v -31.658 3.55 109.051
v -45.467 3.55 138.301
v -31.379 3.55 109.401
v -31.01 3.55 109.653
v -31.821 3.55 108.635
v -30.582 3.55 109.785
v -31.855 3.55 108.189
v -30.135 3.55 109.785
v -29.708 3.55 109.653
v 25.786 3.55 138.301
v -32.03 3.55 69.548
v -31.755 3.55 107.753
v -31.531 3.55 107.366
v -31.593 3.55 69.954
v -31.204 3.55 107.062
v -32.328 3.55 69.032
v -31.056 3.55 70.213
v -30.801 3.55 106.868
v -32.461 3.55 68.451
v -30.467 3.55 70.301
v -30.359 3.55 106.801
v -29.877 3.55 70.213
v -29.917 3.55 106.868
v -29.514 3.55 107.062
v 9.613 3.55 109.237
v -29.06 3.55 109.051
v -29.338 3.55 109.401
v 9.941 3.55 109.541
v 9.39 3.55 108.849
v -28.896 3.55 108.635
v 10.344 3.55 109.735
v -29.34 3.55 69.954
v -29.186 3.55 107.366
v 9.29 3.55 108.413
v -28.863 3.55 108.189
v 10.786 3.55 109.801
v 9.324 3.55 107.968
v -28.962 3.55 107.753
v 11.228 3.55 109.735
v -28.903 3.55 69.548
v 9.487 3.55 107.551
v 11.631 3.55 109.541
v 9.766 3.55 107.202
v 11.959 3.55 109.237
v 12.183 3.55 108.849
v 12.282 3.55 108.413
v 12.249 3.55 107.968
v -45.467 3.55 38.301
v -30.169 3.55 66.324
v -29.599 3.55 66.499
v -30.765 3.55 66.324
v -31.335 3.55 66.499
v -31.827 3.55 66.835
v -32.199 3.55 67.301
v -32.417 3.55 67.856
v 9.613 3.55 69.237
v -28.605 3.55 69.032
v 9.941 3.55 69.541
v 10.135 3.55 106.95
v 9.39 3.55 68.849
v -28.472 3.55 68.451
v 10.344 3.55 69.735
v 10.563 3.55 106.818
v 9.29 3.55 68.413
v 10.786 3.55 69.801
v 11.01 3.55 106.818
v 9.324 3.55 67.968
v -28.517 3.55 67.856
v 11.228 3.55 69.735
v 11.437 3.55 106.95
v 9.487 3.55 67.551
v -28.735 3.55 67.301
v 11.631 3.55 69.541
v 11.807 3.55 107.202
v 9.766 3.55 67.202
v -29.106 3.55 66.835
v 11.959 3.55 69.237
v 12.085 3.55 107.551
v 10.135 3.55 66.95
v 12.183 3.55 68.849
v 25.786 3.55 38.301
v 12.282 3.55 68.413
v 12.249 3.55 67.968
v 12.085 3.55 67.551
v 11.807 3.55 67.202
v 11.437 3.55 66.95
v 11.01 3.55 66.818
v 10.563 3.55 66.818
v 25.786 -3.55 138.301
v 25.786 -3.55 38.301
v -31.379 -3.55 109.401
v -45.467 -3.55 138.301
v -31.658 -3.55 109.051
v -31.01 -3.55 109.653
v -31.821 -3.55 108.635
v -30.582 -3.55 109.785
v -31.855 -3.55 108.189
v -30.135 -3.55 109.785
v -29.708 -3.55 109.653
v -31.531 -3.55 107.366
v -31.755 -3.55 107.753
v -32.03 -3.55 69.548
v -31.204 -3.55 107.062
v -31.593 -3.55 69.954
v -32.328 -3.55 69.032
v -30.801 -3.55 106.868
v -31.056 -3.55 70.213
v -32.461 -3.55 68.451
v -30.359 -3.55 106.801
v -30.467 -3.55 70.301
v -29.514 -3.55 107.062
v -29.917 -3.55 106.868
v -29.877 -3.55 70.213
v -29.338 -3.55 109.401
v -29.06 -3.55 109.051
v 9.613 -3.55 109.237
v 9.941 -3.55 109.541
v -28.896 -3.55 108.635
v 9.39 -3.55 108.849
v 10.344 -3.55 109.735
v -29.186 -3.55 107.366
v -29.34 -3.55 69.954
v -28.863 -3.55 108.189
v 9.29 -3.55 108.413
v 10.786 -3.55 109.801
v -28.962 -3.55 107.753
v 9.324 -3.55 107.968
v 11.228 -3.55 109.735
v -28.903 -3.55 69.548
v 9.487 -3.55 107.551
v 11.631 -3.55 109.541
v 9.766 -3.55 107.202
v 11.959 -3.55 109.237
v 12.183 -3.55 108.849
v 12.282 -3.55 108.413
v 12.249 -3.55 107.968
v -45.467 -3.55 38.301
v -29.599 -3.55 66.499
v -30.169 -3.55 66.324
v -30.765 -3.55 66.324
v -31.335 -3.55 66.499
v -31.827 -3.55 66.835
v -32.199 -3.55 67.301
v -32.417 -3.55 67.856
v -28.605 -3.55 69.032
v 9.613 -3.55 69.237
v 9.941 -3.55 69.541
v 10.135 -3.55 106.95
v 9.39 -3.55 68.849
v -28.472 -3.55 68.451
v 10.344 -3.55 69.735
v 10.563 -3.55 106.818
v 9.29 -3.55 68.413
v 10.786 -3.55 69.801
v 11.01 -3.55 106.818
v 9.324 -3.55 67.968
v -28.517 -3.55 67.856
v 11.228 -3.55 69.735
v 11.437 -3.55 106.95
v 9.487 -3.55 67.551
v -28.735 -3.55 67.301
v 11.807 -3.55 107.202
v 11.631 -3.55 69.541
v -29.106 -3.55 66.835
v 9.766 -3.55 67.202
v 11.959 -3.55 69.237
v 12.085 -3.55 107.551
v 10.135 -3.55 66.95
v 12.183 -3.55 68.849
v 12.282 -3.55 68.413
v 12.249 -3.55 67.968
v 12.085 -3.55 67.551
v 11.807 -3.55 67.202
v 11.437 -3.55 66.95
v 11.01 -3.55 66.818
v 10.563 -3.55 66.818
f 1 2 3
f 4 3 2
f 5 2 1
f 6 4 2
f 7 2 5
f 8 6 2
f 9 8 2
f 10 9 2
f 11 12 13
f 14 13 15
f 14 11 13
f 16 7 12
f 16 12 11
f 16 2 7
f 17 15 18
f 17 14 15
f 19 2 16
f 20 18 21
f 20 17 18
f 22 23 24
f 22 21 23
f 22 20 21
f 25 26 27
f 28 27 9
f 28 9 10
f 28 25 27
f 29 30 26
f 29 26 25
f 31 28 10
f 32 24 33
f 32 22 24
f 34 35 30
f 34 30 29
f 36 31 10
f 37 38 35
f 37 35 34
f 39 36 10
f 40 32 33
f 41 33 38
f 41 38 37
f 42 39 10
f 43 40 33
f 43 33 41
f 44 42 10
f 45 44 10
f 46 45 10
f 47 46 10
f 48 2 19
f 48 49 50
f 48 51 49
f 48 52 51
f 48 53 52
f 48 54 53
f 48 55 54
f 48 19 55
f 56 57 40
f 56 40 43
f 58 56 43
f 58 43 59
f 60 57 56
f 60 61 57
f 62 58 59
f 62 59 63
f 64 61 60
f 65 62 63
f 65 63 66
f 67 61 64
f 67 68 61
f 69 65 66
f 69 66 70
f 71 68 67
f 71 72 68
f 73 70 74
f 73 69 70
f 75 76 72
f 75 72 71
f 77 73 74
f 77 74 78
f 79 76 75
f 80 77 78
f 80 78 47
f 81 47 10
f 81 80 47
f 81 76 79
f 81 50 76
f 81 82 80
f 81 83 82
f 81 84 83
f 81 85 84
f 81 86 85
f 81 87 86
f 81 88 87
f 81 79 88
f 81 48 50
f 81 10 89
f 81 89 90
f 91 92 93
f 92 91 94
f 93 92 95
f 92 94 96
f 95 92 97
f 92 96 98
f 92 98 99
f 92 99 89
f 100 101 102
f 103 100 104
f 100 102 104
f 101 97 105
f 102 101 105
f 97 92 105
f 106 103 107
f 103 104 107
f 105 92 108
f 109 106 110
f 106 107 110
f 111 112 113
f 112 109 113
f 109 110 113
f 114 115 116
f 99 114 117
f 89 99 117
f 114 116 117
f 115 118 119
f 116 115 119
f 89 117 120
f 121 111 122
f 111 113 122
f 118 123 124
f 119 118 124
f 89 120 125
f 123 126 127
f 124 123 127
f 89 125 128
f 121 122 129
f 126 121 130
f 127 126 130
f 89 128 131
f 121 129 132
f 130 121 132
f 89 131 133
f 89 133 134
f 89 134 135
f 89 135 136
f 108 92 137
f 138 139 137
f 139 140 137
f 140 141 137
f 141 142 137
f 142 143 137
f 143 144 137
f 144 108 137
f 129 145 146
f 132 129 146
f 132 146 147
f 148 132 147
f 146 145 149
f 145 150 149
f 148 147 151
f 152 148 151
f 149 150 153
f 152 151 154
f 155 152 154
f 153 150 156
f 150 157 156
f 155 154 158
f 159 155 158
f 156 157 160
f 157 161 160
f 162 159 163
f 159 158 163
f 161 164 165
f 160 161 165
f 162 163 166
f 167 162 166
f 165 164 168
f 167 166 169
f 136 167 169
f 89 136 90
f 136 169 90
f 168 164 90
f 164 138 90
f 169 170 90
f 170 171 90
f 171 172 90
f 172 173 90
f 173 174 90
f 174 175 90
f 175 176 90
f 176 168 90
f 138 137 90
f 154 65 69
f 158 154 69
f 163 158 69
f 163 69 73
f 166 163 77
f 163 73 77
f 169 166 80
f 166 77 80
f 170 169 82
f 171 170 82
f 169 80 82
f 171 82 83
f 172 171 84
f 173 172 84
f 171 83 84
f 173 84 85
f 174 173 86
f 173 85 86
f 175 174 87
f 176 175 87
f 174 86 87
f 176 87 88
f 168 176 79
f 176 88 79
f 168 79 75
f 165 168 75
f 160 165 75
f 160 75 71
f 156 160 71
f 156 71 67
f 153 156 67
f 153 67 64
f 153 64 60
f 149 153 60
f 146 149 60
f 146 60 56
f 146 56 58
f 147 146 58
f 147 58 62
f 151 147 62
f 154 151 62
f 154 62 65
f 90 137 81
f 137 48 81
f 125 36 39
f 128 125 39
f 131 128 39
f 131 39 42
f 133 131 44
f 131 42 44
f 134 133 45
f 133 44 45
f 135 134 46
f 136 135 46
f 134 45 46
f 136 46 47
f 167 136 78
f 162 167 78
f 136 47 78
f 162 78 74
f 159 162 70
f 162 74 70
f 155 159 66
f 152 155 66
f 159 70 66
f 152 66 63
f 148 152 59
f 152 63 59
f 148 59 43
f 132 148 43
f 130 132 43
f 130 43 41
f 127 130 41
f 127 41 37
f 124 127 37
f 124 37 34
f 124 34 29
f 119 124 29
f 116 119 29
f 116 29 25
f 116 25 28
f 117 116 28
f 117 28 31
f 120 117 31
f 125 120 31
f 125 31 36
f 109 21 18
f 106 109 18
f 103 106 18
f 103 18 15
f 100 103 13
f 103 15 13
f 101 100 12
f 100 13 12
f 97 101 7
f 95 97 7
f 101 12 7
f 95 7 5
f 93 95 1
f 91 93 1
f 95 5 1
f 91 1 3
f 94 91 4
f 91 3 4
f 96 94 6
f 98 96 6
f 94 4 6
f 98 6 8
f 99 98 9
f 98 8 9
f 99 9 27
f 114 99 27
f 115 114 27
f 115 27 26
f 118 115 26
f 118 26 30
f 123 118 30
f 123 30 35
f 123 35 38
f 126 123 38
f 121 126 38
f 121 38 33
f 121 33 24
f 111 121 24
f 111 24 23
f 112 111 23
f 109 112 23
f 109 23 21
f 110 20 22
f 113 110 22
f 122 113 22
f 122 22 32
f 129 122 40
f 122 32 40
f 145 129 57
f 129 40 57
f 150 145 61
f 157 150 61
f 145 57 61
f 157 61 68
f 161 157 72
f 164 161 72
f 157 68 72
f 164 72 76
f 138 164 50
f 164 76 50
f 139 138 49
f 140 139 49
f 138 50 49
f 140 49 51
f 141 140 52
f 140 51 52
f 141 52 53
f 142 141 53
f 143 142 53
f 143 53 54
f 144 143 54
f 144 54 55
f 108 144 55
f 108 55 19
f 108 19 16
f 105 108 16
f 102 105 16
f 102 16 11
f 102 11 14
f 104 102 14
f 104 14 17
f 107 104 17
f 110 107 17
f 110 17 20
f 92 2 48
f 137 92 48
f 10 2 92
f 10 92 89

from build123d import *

# Parameters (mm, degrees)
SKETCH1_W           = 71.252977654
SKETCH1_H           = 100
BOSS_EXTRUDE1_DEPTH = 3.55
SKETCH6_R           = 1.5
SKETCH6_R_2         = 2
CUT_EXTRUDE11_DEPTH = 146.045946322


with BuildPart() as part:
    # Sketch1 → Boss-Extrude1 (new, symmetric)
    with BuildSketch(Plane(origin=(0, 0, 0.748863832), x_dir=(1, 0, 0), z_dir=(0, 1, 0))):
        with Locations((-9.840244689, -87.552508839)):
            Rectangle(SKETCH1_W, SKETCH1_H)
    extrude(amount=BOSS_EXTRUDE1_DEPTH, both=True)

    # Sketch6 → Cut-Extrude11 (cut, through all)
    with BuildSketch(Plane(origin=(0, 3.55, 0.748863832), x_dir=(1, 0, 0), z_dir=(0, 1, 0))):
        with Locations(Location((10.786244138, -67.552508839, 0), (0, 0, 270))):
            Circle(SKETCH6_R)
        with Locations(Location((-30.466733516, -67.552508839, 0), (0, 0, 270))):
            Circle(SKETCH6_R_2)
        with Locations(Location((10.786244138, -107.552508839, 0), (0, 0, 270))):
            Circle(SKETCH6_R)
        with Locations(Location((-30.35873493, -107.552508839, 0), (0, 0, 90))):
            Circle(SKETCH6_R)
    extrude(amount=-CUT_EXTRUDE11_DEPTH, mode=Mode.SUBTRACT)


solid = part.part
